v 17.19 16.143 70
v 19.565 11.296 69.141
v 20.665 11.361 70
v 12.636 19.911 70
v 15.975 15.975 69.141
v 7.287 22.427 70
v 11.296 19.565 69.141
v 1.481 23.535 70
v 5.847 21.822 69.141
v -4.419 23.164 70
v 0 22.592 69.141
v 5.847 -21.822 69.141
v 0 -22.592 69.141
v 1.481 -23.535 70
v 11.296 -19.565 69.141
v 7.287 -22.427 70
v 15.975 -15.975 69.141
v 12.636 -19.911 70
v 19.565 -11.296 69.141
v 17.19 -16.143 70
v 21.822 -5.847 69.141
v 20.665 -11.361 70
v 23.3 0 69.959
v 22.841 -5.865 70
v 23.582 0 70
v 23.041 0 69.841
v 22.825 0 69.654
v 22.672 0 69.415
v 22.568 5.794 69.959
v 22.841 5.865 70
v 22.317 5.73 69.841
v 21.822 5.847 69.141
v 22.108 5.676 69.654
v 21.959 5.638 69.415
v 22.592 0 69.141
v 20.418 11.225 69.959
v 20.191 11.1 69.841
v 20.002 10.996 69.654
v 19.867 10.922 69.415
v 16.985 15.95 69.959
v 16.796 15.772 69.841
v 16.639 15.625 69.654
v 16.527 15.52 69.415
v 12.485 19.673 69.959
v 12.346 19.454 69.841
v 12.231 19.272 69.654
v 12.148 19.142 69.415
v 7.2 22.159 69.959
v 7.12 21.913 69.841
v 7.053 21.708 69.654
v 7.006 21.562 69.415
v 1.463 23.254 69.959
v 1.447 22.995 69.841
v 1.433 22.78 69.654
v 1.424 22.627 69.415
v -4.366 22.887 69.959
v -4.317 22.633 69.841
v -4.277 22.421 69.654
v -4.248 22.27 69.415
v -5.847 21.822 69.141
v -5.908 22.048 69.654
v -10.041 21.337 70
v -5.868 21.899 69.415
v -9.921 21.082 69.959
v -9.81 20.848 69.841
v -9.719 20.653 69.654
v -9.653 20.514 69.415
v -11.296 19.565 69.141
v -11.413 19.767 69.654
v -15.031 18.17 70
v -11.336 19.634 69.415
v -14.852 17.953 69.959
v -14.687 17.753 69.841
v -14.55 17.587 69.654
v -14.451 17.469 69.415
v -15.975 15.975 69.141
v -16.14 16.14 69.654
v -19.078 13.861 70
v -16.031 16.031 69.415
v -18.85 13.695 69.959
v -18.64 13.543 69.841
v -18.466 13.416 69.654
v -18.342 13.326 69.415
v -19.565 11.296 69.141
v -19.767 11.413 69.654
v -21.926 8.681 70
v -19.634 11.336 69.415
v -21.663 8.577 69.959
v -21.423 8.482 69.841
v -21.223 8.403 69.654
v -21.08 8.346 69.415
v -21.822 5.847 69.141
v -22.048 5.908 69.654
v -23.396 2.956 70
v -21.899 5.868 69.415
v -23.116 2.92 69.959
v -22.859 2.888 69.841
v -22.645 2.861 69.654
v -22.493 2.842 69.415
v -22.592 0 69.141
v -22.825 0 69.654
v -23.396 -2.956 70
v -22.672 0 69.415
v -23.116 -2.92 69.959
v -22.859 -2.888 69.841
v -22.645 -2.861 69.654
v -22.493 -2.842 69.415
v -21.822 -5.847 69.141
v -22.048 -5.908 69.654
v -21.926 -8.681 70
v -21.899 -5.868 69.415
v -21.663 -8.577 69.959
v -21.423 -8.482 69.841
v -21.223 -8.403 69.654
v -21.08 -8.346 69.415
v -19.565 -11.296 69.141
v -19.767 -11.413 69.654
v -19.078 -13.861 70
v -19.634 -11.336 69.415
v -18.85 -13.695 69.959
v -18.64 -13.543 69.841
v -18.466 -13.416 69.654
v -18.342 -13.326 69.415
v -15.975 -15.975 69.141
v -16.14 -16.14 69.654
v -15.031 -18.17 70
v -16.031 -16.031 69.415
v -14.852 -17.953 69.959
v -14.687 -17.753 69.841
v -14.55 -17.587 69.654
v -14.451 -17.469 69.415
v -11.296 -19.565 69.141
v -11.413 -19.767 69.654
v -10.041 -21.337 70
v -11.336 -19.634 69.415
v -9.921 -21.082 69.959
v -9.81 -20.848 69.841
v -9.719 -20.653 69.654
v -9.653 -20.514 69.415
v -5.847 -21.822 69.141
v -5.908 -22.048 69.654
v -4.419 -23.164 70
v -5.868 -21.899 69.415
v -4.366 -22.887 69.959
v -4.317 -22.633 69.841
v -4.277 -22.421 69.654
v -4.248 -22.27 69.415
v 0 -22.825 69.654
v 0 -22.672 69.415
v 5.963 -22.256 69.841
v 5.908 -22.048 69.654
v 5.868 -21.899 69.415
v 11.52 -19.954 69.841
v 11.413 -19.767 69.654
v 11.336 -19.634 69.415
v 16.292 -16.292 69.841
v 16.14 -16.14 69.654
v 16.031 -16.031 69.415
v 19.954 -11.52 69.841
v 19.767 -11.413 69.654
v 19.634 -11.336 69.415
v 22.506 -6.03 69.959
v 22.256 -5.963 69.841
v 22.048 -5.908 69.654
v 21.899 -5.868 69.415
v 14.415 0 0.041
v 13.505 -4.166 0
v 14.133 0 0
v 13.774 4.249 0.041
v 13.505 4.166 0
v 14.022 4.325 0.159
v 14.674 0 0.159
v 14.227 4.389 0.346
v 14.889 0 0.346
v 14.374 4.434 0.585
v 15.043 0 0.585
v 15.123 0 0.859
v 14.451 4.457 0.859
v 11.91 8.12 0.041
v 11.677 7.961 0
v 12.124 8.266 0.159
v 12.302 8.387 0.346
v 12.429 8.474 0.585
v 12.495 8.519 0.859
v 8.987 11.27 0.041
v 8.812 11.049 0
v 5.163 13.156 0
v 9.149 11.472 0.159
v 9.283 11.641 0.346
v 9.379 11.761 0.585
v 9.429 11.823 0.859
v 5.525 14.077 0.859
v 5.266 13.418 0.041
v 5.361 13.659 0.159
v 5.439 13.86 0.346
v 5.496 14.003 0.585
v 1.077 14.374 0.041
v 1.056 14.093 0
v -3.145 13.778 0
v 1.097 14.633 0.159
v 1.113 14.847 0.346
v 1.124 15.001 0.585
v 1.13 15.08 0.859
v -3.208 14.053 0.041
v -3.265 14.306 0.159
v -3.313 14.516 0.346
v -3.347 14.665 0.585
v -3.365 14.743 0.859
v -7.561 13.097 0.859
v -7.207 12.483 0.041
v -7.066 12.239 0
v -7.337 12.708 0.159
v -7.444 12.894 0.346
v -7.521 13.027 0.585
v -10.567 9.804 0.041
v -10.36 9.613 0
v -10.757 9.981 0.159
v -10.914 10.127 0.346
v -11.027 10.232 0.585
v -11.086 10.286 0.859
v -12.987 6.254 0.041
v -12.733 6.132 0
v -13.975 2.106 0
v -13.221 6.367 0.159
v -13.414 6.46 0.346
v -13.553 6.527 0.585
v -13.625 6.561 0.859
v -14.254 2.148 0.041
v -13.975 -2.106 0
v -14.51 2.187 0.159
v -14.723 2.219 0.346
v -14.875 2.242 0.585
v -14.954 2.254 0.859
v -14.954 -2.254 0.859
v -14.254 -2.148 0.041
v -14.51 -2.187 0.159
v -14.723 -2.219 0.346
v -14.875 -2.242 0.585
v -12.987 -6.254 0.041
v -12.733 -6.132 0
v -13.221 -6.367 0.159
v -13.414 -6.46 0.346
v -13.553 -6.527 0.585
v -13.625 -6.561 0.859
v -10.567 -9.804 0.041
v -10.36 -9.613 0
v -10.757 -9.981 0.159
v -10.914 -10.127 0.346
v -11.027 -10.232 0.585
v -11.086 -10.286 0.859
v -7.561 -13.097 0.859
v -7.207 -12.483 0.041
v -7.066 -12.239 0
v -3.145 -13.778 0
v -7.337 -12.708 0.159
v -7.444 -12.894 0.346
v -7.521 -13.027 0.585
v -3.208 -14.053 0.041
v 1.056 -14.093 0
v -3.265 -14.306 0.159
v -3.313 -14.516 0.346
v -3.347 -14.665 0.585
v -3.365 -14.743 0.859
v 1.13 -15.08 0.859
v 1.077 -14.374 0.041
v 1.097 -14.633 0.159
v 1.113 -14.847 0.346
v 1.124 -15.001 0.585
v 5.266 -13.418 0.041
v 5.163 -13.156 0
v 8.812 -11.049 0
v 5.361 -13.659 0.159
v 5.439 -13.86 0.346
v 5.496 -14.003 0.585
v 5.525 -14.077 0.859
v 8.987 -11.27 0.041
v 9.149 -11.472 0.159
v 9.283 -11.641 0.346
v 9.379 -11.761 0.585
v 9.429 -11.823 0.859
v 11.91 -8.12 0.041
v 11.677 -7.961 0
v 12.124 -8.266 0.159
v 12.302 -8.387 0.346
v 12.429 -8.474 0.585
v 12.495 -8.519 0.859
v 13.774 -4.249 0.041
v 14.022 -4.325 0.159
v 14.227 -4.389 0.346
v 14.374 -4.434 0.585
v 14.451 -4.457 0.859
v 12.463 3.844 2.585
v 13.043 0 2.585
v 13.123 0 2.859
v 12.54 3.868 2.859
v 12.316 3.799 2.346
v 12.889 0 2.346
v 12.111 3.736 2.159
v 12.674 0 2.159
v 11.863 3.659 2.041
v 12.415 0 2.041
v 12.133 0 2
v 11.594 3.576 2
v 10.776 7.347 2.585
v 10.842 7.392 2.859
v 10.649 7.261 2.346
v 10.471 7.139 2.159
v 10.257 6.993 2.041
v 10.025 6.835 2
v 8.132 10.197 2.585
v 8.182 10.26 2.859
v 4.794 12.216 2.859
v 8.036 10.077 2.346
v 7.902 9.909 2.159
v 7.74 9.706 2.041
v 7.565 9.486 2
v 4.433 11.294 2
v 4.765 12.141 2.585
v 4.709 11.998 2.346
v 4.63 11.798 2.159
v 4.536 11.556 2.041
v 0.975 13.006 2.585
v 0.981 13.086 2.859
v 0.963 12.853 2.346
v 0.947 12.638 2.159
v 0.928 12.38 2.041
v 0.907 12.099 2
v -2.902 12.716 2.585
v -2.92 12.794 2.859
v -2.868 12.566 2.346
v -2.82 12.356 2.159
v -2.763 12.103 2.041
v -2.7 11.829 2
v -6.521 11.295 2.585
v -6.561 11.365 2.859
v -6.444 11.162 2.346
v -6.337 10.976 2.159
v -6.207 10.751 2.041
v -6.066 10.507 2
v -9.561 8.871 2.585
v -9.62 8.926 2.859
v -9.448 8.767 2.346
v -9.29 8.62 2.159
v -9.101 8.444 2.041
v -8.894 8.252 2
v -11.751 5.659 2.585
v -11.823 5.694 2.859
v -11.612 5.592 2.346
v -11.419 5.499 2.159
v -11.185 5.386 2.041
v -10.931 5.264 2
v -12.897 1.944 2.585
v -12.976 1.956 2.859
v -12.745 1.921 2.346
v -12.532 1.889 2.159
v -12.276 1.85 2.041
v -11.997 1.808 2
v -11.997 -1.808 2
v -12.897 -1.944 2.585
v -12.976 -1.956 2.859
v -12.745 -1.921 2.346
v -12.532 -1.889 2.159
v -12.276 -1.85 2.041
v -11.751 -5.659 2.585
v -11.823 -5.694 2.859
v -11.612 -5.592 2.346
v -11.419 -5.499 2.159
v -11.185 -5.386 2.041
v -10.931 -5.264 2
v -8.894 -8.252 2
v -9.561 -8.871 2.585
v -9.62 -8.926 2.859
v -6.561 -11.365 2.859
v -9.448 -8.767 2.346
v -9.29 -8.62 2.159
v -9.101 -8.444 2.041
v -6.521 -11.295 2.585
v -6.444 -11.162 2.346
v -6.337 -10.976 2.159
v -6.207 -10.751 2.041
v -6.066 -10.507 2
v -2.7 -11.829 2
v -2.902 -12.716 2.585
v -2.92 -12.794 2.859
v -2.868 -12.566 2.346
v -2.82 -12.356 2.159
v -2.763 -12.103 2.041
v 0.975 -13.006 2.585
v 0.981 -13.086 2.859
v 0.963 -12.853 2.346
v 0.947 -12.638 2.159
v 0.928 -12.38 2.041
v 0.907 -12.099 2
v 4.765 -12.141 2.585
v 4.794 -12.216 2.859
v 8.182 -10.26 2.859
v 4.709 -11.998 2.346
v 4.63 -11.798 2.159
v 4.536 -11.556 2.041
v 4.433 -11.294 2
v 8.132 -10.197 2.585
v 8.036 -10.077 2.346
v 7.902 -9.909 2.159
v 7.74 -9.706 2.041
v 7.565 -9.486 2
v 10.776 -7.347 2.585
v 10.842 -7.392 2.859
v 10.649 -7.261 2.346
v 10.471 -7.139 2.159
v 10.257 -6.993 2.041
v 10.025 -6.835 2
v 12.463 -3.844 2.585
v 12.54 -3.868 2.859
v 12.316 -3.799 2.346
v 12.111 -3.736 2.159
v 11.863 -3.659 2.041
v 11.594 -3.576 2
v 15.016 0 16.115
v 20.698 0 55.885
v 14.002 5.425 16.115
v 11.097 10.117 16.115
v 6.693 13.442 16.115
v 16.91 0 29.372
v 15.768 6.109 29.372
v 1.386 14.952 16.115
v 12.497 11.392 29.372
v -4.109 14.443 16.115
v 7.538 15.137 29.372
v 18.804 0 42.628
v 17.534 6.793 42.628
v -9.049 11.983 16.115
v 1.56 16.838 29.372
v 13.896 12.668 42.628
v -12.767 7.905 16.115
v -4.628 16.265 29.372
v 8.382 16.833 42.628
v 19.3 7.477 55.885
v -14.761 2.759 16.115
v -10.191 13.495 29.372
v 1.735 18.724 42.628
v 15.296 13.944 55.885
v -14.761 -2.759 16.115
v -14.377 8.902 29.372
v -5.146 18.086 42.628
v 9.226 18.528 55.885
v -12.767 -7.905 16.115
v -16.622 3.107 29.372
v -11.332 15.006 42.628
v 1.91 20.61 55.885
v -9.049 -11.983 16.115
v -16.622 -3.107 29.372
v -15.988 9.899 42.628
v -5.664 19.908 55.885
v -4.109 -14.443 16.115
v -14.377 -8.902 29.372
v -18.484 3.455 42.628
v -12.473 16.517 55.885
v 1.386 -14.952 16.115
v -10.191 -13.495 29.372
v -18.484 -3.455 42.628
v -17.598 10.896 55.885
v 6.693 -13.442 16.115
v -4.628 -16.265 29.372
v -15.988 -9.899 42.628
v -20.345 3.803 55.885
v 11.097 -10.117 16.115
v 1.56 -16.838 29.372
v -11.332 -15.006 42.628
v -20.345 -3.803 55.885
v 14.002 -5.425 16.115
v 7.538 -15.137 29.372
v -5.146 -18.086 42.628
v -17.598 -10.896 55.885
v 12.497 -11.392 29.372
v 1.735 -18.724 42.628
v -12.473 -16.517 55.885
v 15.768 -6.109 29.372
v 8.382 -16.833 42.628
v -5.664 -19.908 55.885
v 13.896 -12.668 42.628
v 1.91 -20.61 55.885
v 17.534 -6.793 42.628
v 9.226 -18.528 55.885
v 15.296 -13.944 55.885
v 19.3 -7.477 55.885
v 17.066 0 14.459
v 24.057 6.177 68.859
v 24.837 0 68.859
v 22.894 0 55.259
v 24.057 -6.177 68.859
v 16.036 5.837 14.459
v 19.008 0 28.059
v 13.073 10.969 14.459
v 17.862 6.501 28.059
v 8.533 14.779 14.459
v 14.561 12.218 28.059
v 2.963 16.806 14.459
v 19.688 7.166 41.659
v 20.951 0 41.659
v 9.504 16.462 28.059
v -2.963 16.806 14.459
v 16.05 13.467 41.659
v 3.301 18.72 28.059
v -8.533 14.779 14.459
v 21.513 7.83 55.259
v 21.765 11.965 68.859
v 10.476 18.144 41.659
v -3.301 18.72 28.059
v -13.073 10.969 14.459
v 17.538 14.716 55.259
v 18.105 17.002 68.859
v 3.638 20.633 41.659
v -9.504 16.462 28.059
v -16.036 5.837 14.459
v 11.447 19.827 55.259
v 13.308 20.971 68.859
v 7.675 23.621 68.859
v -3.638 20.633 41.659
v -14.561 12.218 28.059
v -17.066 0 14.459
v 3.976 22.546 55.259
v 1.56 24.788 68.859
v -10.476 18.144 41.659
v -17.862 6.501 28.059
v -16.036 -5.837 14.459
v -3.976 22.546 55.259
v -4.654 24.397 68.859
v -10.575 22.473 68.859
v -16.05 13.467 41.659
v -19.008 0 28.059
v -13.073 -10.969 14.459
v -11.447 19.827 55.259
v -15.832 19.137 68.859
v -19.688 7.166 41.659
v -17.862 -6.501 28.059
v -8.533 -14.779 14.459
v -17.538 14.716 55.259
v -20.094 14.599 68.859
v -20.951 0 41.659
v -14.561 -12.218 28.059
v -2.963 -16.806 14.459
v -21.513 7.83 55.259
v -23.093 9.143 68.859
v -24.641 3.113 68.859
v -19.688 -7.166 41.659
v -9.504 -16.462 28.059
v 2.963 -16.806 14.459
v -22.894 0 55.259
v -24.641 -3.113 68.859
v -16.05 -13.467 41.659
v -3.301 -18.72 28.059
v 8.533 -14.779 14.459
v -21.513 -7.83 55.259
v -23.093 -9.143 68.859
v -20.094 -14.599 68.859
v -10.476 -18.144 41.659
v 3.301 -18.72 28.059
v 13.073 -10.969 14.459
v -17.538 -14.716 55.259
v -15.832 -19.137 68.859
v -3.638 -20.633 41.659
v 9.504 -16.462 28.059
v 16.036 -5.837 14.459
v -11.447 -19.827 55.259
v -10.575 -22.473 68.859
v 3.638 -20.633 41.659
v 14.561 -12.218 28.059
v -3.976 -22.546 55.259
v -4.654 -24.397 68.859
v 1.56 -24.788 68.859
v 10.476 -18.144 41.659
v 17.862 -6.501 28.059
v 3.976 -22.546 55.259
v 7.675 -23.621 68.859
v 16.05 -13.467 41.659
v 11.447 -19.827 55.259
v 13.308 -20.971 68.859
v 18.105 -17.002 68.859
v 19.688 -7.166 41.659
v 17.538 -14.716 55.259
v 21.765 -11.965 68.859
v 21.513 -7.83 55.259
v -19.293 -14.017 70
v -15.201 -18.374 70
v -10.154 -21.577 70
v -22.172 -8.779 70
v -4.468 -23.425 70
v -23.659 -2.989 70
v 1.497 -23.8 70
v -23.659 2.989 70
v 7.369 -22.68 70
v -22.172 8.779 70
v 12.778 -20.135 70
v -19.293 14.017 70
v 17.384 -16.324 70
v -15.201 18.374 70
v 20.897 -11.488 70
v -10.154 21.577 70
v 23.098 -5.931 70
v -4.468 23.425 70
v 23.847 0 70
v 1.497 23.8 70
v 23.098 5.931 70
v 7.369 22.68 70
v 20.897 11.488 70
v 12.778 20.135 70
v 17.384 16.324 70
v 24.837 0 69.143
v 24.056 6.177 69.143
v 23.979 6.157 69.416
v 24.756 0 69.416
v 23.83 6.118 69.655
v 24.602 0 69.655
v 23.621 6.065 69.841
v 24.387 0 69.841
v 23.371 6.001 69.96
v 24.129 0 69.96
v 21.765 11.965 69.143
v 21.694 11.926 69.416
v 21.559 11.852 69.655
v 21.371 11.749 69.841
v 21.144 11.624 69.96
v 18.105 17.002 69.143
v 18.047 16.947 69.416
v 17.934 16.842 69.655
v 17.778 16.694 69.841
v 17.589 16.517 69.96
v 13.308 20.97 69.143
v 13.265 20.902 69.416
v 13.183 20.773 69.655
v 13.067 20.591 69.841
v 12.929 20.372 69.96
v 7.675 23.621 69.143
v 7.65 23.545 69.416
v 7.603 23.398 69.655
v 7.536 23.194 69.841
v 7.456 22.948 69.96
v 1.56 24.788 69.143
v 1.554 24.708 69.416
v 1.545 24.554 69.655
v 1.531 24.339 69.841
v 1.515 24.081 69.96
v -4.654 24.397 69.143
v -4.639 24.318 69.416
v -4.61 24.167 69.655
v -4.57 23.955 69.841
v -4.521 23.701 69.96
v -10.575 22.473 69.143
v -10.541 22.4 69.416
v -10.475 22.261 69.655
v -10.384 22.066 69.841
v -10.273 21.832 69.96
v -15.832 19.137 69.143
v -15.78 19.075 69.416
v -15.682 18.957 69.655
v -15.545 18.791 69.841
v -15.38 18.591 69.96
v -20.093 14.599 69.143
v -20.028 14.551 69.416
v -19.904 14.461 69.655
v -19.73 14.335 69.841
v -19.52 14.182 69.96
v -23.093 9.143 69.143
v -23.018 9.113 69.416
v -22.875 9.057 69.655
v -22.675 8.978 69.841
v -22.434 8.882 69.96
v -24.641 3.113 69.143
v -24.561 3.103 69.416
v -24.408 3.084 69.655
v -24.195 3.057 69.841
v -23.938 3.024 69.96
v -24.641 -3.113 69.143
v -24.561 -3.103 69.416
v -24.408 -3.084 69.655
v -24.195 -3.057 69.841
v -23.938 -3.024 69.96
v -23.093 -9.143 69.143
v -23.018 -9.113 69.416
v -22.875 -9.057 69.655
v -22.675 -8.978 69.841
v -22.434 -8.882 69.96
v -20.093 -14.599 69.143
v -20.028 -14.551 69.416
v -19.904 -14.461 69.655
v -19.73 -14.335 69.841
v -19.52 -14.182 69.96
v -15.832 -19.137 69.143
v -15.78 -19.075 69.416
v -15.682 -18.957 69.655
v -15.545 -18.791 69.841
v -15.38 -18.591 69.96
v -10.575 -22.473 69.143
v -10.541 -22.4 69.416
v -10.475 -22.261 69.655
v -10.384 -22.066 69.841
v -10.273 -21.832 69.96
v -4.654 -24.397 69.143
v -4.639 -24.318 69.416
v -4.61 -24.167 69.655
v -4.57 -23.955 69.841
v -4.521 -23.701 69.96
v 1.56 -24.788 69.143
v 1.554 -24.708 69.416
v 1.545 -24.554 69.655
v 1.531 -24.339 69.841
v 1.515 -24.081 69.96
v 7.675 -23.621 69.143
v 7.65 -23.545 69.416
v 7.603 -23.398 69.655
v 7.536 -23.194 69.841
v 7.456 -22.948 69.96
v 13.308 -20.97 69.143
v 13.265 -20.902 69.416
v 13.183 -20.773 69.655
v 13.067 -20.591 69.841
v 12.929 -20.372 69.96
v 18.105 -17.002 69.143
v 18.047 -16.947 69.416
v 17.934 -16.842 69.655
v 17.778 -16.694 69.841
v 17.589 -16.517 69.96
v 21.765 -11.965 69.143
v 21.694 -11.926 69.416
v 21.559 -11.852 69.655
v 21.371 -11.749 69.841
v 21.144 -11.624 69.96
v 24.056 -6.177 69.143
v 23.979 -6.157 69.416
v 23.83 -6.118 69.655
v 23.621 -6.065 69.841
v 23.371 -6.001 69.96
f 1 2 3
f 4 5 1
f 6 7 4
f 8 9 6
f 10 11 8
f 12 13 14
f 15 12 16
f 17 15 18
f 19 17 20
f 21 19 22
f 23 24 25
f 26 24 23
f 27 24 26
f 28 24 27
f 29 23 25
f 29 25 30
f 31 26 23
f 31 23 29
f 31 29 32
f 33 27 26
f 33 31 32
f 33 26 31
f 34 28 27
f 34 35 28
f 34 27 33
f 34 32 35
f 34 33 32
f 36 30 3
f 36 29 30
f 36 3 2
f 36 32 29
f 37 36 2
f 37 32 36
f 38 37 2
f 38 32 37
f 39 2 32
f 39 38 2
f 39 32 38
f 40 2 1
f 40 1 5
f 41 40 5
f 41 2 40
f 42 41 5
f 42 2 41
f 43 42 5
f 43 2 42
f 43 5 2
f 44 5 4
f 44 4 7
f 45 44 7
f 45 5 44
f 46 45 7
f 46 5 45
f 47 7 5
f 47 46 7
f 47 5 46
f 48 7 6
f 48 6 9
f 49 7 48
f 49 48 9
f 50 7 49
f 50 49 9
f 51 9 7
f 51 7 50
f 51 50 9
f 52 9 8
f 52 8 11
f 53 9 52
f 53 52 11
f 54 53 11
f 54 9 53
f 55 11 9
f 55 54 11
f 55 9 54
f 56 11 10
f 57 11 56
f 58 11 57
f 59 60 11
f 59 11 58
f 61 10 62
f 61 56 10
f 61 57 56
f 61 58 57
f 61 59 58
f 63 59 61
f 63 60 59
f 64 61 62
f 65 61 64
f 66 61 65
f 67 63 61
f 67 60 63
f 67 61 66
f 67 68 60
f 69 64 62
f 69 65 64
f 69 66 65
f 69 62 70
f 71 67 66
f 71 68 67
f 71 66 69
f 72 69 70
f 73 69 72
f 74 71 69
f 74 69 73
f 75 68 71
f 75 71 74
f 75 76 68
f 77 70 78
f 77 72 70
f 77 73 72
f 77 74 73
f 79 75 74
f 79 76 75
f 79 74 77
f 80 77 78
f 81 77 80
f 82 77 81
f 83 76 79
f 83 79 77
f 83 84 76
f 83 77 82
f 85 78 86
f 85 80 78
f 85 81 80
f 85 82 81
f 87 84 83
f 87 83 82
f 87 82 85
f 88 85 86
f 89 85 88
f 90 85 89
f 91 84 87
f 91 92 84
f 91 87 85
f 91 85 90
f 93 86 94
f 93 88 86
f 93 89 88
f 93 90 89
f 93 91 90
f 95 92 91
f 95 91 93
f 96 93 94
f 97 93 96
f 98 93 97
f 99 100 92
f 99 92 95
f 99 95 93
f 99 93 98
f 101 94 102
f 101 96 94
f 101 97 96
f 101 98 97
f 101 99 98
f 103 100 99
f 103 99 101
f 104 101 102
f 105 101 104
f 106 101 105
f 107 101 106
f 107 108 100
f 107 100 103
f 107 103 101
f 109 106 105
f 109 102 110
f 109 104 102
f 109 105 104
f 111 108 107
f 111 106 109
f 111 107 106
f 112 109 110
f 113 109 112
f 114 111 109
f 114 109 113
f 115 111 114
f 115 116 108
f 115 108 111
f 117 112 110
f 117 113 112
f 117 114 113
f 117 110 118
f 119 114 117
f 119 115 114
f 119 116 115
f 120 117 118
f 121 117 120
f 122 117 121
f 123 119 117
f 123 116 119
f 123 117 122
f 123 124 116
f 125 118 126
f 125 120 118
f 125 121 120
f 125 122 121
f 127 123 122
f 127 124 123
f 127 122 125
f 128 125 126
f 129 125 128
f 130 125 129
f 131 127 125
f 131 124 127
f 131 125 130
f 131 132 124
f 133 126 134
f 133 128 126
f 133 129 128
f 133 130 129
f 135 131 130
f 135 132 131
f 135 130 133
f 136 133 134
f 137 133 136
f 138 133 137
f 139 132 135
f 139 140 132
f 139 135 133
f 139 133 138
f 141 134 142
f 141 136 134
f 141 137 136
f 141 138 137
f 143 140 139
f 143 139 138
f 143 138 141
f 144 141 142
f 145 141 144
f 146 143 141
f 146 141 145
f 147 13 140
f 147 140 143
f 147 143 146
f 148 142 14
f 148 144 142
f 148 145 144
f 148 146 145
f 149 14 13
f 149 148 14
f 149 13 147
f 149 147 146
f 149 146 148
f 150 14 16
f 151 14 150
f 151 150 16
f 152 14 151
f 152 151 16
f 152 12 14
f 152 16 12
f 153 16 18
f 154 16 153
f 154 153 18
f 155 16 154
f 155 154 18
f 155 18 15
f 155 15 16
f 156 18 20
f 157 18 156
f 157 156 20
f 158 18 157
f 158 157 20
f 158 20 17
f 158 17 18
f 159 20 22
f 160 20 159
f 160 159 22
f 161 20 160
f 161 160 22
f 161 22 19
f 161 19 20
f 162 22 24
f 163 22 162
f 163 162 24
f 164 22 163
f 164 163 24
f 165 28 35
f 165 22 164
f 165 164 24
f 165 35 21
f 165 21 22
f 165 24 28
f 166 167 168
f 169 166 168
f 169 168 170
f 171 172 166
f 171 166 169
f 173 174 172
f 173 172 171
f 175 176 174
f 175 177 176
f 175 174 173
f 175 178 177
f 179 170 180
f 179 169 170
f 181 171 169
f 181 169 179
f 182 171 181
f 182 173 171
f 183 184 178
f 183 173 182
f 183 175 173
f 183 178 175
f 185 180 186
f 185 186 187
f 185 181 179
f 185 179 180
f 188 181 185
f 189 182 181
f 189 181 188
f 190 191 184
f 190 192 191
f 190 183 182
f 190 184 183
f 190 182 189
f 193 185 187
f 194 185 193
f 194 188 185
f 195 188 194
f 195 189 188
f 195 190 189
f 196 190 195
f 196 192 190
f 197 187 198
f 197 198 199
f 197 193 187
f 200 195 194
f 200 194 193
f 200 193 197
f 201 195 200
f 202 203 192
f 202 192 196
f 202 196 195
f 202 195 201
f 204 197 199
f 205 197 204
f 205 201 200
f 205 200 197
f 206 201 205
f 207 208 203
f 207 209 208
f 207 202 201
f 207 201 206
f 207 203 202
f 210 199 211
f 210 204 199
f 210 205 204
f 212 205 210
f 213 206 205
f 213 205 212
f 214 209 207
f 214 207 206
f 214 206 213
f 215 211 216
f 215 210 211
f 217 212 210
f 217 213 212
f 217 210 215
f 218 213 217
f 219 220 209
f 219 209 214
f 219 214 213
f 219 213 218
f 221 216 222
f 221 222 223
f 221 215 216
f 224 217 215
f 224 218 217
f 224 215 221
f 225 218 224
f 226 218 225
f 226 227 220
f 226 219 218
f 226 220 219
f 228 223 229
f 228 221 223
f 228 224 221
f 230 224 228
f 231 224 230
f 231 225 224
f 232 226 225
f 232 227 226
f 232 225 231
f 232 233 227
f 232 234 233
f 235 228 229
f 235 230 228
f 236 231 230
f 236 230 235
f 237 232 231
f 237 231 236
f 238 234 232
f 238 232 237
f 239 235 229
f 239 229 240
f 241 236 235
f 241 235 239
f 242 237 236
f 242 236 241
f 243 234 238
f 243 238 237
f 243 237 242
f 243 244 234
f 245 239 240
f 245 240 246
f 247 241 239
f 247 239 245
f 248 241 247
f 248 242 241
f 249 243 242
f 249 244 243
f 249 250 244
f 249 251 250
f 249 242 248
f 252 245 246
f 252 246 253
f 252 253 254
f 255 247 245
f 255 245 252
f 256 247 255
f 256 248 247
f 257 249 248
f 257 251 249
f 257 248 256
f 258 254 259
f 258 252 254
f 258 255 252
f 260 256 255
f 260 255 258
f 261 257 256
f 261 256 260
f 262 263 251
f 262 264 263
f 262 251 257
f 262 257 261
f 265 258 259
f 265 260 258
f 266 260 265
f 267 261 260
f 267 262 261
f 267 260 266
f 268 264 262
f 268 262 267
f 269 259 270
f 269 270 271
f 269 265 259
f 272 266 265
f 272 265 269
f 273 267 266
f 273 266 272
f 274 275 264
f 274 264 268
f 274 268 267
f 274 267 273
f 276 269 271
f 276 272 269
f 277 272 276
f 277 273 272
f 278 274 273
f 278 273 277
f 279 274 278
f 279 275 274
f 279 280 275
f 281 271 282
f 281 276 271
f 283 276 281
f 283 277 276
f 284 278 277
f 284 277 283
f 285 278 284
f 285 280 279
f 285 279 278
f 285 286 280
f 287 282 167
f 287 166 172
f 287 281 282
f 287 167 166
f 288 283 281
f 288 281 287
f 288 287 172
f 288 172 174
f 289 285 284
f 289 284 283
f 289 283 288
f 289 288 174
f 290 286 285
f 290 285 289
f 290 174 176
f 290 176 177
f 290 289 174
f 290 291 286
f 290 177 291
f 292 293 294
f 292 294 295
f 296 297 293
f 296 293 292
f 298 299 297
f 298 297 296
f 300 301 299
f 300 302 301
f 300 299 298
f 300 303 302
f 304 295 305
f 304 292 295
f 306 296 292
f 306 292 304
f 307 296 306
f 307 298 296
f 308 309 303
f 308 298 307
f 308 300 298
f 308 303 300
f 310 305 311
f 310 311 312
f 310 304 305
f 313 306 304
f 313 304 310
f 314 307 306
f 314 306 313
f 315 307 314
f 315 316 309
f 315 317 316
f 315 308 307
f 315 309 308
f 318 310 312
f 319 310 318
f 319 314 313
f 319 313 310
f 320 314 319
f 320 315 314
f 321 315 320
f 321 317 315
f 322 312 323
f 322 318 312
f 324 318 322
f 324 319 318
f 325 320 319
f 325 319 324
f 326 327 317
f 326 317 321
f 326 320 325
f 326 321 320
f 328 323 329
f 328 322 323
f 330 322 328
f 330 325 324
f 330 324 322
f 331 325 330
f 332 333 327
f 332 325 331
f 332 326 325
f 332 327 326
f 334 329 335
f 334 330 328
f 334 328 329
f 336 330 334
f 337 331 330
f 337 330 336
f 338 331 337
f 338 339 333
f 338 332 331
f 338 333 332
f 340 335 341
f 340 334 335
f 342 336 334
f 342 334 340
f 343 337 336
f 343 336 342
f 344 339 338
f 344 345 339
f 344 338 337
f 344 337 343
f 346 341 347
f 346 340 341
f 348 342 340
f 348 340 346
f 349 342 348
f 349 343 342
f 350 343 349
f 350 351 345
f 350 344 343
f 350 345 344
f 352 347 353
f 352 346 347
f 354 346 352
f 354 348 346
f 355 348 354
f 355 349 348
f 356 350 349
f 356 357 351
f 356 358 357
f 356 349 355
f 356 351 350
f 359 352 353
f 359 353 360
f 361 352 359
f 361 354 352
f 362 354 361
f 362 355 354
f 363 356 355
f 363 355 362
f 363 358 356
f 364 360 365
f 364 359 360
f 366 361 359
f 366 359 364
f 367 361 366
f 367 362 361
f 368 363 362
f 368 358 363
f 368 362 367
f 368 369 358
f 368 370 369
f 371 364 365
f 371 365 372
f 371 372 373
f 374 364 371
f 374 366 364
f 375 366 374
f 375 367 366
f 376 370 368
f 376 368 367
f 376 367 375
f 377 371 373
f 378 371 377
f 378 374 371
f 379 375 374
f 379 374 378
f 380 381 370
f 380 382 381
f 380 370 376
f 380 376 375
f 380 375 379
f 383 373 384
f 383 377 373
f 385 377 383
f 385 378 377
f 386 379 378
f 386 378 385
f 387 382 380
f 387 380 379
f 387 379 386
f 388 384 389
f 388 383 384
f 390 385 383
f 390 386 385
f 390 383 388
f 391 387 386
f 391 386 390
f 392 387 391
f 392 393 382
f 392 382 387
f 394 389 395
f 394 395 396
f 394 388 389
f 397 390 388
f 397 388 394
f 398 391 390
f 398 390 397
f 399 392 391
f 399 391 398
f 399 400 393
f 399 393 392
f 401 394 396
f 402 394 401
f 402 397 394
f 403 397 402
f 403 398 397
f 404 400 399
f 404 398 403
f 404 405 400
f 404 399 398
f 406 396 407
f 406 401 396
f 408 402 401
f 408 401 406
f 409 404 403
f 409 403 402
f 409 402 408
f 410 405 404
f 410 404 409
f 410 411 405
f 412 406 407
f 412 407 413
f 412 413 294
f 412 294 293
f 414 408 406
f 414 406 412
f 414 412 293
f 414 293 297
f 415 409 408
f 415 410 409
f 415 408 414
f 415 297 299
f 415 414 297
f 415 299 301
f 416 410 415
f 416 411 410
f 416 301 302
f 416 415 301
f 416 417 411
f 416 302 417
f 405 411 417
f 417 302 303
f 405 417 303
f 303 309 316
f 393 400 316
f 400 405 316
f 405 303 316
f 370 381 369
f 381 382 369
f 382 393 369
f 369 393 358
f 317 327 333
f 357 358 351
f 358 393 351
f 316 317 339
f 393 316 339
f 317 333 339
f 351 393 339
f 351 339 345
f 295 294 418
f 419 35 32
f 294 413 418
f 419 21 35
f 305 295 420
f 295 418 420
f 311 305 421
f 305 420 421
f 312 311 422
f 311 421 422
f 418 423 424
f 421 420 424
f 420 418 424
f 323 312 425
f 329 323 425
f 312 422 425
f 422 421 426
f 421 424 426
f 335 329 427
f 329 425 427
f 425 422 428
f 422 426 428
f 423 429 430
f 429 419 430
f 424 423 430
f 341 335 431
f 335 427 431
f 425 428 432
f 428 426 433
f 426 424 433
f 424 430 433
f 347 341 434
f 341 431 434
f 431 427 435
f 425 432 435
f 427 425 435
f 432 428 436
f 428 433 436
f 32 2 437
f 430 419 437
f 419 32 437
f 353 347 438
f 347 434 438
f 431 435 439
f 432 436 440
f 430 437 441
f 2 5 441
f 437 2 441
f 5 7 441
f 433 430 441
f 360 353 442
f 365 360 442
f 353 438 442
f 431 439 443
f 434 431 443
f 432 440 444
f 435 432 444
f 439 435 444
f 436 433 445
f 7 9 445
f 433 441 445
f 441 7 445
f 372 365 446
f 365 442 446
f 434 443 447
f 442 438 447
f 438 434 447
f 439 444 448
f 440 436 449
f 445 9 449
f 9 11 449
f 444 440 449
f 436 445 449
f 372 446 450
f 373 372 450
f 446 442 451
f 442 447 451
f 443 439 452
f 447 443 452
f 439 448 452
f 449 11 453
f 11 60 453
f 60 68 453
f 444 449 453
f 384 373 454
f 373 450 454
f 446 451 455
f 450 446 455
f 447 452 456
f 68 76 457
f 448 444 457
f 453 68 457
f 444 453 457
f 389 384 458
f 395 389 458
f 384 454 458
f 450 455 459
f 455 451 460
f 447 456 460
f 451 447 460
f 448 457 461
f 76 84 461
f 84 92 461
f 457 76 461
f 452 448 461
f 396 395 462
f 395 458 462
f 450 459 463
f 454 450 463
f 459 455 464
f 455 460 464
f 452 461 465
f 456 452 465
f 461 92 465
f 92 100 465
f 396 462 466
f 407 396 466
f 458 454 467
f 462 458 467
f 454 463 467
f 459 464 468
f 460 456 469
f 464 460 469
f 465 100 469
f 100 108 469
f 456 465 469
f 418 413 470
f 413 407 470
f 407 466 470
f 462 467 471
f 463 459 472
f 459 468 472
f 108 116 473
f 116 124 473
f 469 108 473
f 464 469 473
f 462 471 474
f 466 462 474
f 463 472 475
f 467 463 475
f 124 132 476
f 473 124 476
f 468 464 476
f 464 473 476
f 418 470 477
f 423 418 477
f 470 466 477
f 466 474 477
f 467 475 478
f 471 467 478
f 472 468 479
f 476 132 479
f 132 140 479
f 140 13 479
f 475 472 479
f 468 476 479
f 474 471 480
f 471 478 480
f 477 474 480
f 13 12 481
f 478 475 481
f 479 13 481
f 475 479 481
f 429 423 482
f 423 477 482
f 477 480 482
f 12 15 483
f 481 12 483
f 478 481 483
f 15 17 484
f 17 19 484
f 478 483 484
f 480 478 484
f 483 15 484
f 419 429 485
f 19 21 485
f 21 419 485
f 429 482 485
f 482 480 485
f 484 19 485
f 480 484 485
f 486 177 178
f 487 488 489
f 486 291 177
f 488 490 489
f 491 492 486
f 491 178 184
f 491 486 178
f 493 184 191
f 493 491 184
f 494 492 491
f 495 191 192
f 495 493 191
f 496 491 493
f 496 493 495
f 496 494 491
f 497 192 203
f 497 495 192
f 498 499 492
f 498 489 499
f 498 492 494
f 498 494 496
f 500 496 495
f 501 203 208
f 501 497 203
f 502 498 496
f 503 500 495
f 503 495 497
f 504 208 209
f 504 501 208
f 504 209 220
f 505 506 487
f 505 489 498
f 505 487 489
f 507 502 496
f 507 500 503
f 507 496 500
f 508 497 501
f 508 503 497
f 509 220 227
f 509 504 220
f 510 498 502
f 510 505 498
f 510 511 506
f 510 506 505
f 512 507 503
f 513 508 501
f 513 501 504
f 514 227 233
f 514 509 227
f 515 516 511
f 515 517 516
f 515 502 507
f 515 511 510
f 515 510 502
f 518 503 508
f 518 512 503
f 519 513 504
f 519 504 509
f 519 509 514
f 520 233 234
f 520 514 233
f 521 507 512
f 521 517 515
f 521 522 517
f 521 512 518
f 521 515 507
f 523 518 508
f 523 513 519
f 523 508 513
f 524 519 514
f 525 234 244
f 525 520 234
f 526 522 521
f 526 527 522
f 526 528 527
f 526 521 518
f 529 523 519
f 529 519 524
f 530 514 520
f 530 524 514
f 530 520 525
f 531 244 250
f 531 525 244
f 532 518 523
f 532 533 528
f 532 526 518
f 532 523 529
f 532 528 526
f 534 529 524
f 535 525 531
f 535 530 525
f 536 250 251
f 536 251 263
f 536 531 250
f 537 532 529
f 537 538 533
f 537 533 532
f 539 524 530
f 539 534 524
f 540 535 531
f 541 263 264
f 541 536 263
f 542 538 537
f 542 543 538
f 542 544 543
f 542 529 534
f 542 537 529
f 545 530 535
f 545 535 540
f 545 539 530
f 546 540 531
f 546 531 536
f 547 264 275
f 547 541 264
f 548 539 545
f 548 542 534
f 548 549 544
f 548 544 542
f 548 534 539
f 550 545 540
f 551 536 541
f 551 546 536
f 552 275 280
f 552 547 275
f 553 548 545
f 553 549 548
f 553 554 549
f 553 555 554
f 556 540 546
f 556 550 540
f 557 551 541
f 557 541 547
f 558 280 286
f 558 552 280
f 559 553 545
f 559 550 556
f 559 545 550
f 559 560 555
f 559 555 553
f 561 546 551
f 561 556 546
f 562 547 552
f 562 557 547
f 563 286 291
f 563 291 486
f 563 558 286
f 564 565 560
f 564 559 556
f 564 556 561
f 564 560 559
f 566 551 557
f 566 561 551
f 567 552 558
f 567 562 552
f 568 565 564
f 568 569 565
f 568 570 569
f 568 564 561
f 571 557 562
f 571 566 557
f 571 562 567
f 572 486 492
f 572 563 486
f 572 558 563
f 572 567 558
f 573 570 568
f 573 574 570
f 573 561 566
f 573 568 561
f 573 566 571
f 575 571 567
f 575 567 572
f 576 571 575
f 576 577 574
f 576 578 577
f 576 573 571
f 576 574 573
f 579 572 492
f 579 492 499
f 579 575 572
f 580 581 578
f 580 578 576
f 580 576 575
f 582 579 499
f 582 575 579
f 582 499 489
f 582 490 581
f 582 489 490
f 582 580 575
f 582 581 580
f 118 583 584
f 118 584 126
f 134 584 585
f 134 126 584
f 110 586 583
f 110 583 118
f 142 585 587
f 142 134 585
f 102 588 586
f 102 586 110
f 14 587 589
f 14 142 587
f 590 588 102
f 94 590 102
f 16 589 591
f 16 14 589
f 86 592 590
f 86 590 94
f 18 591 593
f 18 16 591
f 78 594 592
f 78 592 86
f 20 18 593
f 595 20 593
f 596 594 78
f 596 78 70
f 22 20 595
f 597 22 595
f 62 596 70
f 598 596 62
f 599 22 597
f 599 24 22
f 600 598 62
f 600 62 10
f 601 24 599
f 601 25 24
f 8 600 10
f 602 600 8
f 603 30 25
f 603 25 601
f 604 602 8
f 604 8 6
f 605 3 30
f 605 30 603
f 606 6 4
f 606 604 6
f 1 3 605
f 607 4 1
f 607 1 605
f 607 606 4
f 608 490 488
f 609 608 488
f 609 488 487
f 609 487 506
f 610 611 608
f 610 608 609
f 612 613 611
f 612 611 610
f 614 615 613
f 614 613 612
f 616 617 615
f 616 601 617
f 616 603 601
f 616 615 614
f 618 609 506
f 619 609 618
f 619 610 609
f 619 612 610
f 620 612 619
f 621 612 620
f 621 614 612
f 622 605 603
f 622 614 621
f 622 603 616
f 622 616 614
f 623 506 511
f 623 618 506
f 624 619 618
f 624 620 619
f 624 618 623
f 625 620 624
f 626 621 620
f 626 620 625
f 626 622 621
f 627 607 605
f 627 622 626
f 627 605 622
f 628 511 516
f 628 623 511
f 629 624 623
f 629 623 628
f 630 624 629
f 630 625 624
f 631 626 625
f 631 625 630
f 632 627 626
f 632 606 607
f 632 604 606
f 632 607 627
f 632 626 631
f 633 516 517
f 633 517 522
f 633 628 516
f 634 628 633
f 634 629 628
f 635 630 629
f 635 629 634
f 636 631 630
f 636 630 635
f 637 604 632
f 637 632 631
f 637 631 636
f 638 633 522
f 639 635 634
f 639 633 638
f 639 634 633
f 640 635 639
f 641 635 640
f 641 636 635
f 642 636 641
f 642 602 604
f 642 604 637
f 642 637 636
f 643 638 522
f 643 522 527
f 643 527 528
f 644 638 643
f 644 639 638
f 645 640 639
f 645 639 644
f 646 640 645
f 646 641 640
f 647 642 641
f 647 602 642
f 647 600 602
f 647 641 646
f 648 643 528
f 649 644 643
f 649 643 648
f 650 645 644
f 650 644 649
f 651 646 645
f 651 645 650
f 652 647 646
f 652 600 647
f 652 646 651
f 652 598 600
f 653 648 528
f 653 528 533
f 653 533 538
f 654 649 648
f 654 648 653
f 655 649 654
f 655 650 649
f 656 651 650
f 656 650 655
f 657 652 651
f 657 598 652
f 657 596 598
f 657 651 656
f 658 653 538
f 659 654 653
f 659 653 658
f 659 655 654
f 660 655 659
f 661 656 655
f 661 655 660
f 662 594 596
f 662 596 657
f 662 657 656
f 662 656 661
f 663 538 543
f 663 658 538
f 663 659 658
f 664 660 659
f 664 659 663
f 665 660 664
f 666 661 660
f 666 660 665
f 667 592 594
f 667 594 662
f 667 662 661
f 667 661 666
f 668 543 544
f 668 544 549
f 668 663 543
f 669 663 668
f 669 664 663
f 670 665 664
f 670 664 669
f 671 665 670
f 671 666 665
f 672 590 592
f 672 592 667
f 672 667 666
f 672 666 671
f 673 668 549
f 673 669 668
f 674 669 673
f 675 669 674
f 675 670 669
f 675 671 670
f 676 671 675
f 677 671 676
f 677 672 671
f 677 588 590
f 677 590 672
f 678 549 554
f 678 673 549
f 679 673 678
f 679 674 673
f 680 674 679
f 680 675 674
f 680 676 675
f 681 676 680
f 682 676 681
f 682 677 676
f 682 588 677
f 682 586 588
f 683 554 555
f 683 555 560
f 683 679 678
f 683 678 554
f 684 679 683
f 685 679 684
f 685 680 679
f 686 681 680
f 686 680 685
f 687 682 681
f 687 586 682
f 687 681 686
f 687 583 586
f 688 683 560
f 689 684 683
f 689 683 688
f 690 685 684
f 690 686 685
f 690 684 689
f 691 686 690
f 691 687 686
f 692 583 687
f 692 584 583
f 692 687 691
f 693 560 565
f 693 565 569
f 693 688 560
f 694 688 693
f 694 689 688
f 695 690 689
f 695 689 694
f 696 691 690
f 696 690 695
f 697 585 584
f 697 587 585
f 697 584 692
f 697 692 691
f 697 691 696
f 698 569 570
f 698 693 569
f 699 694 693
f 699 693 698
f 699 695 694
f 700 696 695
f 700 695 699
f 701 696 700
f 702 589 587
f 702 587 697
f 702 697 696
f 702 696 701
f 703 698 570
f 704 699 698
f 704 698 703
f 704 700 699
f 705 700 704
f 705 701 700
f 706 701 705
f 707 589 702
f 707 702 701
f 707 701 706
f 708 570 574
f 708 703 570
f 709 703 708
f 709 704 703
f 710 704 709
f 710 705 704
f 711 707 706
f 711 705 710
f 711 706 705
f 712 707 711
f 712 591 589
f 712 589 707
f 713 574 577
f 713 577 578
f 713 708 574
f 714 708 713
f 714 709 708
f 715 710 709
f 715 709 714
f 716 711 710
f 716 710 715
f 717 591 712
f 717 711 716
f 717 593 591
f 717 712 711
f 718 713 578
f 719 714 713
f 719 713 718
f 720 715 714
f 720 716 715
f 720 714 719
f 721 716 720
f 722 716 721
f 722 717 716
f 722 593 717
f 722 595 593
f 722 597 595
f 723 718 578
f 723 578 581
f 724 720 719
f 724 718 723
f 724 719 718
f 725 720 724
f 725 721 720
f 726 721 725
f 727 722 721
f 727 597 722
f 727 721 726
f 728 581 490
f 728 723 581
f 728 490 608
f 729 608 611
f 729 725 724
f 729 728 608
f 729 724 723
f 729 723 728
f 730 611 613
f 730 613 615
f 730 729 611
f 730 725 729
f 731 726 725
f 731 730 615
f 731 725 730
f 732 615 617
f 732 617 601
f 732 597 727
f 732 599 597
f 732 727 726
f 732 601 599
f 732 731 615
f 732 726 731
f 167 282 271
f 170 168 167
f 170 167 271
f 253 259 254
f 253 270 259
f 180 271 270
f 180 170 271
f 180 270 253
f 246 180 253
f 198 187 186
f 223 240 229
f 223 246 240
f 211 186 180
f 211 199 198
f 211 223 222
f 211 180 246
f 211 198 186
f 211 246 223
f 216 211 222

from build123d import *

# Parameters (mm, degrees)
FILLET_R = 1


with BuildPart() as cone001:
    # Cone001 → Cone001 (revolve)
    with BuildSketch(Plane(origin=(0, 0, 2), x_dir=(1, 0, 0), z_dir=(0, -1, 0))):
        Polygon((0, 0), (13, 0), (23, 70), (0, 70), align=None)
    revolve(axis=Axis((0, 0, 2), (0, 0, 1)))


with BuildPart() as fillet_body:
    # Cone → Cone (revolve)
    with BuildSketch(Plane.XZ):
        Polygon((0, 0), (15, 0), (25, 70), (0, 70), align=None)
    revolve(axis=Axis((0, 0, 0), (0, 0, 1)))

    # Cut: cut Cone001
    add(cone001.part, mode=Mode.SUBTRACT)

    # Fillet
    fillet_edges = [fillet_body.edges().sort_by_distance(p)[0] for p in [
        (-25, 0, 70),
        (-15, 0, 0),
        (-22.714286, 0, 70),
        (-13, 0, 2),
    ]]
    fillet(fillet_edges, radius=FILLET_R)


solid = fillet_body.part
